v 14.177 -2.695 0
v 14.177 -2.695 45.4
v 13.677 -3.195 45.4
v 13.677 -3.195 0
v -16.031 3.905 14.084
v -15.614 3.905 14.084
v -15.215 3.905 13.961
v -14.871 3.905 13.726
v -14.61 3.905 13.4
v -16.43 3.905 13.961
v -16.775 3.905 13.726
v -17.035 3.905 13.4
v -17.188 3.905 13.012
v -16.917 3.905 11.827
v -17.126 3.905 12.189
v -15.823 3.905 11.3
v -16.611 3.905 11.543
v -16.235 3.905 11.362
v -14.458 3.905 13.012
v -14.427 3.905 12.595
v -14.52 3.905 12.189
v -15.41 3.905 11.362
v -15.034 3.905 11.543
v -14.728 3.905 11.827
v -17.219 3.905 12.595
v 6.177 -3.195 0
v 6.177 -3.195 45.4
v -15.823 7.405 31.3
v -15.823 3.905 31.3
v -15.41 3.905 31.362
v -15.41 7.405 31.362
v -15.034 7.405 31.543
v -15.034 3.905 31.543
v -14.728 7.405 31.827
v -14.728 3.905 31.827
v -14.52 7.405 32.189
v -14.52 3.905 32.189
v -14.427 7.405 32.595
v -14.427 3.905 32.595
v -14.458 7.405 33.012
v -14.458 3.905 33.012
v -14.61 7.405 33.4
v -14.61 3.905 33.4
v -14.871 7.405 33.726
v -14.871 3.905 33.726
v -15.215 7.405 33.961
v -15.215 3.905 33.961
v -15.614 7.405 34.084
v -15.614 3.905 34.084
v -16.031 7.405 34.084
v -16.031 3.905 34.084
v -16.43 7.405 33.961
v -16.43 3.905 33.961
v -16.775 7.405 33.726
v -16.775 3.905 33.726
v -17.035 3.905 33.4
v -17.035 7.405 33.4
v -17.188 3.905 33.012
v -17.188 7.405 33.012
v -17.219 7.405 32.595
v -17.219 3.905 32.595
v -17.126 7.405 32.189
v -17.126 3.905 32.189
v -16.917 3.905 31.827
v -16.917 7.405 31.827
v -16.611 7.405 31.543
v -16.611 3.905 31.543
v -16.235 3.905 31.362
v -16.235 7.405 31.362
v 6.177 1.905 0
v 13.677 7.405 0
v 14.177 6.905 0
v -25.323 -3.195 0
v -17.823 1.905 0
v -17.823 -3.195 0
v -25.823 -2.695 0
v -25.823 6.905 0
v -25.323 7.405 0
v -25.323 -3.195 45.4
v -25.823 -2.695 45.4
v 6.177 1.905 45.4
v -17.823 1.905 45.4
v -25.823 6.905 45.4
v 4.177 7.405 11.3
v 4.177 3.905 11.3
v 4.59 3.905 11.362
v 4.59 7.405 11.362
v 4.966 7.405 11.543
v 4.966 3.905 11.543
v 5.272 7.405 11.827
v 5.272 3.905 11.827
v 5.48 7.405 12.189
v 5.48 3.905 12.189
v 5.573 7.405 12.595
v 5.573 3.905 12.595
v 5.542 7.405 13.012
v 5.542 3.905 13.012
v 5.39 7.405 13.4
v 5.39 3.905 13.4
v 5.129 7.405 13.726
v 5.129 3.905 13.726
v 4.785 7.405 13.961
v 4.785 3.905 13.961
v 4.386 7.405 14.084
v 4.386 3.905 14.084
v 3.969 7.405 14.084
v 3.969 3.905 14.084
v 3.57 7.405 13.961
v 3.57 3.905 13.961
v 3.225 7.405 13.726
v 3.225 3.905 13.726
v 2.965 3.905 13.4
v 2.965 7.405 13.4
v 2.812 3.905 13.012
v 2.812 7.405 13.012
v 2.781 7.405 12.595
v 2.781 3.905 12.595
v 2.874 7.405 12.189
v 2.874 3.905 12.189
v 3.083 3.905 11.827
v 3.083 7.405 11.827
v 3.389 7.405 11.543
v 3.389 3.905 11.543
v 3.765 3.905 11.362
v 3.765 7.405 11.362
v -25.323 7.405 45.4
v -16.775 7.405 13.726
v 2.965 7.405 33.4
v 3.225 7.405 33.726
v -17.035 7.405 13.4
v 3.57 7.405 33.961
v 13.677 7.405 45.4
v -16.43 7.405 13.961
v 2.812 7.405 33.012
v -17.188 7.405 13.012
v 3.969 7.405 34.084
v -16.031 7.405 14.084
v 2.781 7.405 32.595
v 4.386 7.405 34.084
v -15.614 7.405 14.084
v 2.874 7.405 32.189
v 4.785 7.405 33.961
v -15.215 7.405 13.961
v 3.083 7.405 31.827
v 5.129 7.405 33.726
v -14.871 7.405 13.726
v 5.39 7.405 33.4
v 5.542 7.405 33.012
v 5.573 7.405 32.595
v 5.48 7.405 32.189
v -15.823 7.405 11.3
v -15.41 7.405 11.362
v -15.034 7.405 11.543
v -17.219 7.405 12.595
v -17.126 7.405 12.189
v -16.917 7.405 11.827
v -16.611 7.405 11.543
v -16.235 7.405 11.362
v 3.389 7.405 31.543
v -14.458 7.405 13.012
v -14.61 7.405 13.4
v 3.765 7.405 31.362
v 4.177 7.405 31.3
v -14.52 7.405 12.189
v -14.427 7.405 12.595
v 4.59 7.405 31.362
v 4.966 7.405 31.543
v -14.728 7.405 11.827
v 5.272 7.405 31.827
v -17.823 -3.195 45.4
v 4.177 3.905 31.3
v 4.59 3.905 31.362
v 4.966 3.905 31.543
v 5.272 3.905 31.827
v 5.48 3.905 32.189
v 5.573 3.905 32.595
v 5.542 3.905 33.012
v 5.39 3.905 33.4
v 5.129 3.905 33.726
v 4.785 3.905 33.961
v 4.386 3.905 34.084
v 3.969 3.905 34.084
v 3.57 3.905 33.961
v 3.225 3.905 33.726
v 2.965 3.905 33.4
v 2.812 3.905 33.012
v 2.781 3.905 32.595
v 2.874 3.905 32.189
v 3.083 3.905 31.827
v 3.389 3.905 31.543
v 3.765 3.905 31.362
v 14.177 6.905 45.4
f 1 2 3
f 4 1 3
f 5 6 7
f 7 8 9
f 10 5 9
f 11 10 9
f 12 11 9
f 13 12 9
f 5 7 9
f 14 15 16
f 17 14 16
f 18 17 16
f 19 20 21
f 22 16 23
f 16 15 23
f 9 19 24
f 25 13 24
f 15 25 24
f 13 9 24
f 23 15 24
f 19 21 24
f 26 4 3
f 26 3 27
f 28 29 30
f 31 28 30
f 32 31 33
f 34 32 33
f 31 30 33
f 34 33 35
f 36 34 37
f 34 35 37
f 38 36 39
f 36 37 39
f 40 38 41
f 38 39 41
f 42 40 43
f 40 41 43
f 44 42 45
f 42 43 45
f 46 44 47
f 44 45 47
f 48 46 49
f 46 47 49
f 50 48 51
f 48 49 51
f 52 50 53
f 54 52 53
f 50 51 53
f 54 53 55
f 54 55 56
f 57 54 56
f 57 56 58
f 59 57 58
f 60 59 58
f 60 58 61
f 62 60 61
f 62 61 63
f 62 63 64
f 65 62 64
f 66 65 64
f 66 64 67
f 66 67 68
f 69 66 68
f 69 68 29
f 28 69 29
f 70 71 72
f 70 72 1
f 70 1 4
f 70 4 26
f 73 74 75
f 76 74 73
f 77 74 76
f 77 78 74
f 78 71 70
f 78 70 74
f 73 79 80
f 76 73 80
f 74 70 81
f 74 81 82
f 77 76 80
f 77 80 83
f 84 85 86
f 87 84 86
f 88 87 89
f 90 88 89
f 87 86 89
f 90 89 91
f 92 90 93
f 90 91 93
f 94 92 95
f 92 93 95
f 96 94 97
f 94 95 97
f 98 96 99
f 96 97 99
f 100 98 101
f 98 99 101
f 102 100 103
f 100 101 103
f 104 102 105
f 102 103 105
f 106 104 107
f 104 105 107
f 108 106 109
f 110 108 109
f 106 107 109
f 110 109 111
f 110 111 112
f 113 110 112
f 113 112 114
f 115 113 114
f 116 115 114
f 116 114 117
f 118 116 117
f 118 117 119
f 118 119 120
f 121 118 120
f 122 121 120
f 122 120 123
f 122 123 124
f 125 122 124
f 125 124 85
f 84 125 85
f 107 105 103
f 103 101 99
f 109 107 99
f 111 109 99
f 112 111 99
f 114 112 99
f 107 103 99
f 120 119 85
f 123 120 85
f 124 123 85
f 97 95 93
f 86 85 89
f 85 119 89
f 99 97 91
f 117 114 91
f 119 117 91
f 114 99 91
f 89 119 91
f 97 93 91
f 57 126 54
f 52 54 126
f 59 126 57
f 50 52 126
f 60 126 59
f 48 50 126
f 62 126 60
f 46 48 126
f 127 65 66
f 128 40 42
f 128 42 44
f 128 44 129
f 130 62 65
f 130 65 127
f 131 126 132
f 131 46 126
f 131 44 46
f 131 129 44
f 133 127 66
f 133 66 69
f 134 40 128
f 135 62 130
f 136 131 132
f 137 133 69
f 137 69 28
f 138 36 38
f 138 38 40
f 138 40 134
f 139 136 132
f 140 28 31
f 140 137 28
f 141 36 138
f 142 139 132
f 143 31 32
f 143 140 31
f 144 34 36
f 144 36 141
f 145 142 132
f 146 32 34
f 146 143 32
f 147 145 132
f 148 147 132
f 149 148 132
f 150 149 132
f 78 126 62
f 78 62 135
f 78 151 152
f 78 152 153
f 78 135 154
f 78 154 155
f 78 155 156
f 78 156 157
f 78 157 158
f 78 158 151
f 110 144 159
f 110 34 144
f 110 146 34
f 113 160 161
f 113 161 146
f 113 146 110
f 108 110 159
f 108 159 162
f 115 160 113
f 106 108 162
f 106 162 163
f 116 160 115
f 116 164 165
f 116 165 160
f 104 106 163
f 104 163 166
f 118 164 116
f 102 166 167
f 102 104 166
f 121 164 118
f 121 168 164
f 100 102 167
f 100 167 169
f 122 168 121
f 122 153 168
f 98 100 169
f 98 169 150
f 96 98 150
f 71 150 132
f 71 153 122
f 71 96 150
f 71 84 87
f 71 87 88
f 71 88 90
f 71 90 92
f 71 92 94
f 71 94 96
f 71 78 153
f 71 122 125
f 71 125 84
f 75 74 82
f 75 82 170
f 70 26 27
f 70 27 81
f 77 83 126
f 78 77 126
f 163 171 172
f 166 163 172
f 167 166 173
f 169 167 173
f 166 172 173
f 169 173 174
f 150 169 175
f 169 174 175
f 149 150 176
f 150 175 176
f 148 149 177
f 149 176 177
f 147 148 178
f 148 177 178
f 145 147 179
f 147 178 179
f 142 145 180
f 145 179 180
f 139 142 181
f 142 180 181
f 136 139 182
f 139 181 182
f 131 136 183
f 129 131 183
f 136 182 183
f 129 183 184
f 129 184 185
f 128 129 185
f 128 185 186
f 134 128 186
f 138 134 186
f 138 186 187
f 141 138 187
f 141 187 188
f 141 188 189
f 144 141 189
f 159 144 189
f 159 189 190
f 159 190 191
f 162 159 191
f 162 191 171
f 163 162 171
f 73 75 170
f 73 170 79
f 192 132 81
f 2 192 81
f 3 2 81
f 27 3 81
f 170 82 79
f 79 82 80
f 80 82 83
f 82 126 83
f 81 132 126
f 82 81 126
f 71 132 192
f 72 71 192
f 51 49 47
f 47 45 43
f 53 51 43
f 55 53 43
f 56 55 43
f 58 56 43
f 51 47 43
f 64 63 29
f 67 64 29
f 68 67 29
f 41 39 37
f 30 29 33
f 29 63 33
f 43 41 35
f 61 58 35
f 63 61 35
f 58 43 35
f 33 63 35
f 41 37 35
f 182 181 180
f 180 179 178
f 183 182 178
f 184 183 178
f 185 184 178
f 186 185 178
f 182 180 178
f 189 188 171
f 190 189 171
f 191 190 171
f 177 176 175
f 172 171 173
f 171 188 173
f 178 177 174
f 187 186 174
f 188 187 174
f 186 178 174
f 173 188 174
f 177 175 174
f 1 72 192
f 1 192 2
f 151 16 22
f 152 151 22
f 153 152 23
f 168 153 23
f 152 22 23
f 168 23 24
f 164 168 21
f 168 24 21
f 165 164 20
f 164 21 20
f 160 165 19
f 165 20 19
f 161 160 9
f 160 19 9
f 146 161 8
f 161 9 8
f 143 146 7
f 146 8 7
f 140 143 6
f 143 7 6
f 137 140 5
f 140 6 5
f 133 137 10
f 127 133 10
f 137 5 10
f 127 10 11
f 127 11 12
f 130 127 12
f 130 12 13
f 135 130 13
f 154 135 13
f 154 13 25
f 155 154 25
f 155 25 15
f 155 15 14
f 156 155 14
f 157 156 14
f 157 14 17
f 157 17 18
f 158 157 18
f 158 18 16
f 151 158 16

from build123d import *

# Parameters (mm, degrees)
EXTRUDE_1_DEPTH     = 45.4
HOLE_WIZARD_1_D     = 2.8
HOLE_WIZARD_1_DEPTH = 3.5


with BuildPart() as part:
    # 草图1 → 凸台-拉伸1 (new body)
    with BuildSketch(Plane.XY):
        Polygon((-25.32278481, 7.405063291), (13.67721519, 7.405063291), (14.17721519, 6.905063291), (14.17721519, -2.694936709), (13.67721519, -3.194936709), (6.17721519, -3.194936709), (6.17721519, 1.905063291), (-17.82278481, 1.905063291), (-17.82278481, -3.194936709), (-25.32278481, -3.194936709), (-25.82278481, -2.694936709), (-25.82278481, 6.905063291), align=None)
    extrude(amount=EXTRUDE_1_DEPTH)

    # 孔1
    with Locations(Plane(origin=(4.17721519, 7.405063291, 12.7), x_dir=(0, 0, 1), z_dir=(0, 1, 0))):
        with Locations((0, 0), (20, 0), (0, -20), (20, -20)):
            Hole(HOLE_WIZARD_1_D / 2, depth=HOLE_WIZARD_1_DEPTH)


solid = part.part
